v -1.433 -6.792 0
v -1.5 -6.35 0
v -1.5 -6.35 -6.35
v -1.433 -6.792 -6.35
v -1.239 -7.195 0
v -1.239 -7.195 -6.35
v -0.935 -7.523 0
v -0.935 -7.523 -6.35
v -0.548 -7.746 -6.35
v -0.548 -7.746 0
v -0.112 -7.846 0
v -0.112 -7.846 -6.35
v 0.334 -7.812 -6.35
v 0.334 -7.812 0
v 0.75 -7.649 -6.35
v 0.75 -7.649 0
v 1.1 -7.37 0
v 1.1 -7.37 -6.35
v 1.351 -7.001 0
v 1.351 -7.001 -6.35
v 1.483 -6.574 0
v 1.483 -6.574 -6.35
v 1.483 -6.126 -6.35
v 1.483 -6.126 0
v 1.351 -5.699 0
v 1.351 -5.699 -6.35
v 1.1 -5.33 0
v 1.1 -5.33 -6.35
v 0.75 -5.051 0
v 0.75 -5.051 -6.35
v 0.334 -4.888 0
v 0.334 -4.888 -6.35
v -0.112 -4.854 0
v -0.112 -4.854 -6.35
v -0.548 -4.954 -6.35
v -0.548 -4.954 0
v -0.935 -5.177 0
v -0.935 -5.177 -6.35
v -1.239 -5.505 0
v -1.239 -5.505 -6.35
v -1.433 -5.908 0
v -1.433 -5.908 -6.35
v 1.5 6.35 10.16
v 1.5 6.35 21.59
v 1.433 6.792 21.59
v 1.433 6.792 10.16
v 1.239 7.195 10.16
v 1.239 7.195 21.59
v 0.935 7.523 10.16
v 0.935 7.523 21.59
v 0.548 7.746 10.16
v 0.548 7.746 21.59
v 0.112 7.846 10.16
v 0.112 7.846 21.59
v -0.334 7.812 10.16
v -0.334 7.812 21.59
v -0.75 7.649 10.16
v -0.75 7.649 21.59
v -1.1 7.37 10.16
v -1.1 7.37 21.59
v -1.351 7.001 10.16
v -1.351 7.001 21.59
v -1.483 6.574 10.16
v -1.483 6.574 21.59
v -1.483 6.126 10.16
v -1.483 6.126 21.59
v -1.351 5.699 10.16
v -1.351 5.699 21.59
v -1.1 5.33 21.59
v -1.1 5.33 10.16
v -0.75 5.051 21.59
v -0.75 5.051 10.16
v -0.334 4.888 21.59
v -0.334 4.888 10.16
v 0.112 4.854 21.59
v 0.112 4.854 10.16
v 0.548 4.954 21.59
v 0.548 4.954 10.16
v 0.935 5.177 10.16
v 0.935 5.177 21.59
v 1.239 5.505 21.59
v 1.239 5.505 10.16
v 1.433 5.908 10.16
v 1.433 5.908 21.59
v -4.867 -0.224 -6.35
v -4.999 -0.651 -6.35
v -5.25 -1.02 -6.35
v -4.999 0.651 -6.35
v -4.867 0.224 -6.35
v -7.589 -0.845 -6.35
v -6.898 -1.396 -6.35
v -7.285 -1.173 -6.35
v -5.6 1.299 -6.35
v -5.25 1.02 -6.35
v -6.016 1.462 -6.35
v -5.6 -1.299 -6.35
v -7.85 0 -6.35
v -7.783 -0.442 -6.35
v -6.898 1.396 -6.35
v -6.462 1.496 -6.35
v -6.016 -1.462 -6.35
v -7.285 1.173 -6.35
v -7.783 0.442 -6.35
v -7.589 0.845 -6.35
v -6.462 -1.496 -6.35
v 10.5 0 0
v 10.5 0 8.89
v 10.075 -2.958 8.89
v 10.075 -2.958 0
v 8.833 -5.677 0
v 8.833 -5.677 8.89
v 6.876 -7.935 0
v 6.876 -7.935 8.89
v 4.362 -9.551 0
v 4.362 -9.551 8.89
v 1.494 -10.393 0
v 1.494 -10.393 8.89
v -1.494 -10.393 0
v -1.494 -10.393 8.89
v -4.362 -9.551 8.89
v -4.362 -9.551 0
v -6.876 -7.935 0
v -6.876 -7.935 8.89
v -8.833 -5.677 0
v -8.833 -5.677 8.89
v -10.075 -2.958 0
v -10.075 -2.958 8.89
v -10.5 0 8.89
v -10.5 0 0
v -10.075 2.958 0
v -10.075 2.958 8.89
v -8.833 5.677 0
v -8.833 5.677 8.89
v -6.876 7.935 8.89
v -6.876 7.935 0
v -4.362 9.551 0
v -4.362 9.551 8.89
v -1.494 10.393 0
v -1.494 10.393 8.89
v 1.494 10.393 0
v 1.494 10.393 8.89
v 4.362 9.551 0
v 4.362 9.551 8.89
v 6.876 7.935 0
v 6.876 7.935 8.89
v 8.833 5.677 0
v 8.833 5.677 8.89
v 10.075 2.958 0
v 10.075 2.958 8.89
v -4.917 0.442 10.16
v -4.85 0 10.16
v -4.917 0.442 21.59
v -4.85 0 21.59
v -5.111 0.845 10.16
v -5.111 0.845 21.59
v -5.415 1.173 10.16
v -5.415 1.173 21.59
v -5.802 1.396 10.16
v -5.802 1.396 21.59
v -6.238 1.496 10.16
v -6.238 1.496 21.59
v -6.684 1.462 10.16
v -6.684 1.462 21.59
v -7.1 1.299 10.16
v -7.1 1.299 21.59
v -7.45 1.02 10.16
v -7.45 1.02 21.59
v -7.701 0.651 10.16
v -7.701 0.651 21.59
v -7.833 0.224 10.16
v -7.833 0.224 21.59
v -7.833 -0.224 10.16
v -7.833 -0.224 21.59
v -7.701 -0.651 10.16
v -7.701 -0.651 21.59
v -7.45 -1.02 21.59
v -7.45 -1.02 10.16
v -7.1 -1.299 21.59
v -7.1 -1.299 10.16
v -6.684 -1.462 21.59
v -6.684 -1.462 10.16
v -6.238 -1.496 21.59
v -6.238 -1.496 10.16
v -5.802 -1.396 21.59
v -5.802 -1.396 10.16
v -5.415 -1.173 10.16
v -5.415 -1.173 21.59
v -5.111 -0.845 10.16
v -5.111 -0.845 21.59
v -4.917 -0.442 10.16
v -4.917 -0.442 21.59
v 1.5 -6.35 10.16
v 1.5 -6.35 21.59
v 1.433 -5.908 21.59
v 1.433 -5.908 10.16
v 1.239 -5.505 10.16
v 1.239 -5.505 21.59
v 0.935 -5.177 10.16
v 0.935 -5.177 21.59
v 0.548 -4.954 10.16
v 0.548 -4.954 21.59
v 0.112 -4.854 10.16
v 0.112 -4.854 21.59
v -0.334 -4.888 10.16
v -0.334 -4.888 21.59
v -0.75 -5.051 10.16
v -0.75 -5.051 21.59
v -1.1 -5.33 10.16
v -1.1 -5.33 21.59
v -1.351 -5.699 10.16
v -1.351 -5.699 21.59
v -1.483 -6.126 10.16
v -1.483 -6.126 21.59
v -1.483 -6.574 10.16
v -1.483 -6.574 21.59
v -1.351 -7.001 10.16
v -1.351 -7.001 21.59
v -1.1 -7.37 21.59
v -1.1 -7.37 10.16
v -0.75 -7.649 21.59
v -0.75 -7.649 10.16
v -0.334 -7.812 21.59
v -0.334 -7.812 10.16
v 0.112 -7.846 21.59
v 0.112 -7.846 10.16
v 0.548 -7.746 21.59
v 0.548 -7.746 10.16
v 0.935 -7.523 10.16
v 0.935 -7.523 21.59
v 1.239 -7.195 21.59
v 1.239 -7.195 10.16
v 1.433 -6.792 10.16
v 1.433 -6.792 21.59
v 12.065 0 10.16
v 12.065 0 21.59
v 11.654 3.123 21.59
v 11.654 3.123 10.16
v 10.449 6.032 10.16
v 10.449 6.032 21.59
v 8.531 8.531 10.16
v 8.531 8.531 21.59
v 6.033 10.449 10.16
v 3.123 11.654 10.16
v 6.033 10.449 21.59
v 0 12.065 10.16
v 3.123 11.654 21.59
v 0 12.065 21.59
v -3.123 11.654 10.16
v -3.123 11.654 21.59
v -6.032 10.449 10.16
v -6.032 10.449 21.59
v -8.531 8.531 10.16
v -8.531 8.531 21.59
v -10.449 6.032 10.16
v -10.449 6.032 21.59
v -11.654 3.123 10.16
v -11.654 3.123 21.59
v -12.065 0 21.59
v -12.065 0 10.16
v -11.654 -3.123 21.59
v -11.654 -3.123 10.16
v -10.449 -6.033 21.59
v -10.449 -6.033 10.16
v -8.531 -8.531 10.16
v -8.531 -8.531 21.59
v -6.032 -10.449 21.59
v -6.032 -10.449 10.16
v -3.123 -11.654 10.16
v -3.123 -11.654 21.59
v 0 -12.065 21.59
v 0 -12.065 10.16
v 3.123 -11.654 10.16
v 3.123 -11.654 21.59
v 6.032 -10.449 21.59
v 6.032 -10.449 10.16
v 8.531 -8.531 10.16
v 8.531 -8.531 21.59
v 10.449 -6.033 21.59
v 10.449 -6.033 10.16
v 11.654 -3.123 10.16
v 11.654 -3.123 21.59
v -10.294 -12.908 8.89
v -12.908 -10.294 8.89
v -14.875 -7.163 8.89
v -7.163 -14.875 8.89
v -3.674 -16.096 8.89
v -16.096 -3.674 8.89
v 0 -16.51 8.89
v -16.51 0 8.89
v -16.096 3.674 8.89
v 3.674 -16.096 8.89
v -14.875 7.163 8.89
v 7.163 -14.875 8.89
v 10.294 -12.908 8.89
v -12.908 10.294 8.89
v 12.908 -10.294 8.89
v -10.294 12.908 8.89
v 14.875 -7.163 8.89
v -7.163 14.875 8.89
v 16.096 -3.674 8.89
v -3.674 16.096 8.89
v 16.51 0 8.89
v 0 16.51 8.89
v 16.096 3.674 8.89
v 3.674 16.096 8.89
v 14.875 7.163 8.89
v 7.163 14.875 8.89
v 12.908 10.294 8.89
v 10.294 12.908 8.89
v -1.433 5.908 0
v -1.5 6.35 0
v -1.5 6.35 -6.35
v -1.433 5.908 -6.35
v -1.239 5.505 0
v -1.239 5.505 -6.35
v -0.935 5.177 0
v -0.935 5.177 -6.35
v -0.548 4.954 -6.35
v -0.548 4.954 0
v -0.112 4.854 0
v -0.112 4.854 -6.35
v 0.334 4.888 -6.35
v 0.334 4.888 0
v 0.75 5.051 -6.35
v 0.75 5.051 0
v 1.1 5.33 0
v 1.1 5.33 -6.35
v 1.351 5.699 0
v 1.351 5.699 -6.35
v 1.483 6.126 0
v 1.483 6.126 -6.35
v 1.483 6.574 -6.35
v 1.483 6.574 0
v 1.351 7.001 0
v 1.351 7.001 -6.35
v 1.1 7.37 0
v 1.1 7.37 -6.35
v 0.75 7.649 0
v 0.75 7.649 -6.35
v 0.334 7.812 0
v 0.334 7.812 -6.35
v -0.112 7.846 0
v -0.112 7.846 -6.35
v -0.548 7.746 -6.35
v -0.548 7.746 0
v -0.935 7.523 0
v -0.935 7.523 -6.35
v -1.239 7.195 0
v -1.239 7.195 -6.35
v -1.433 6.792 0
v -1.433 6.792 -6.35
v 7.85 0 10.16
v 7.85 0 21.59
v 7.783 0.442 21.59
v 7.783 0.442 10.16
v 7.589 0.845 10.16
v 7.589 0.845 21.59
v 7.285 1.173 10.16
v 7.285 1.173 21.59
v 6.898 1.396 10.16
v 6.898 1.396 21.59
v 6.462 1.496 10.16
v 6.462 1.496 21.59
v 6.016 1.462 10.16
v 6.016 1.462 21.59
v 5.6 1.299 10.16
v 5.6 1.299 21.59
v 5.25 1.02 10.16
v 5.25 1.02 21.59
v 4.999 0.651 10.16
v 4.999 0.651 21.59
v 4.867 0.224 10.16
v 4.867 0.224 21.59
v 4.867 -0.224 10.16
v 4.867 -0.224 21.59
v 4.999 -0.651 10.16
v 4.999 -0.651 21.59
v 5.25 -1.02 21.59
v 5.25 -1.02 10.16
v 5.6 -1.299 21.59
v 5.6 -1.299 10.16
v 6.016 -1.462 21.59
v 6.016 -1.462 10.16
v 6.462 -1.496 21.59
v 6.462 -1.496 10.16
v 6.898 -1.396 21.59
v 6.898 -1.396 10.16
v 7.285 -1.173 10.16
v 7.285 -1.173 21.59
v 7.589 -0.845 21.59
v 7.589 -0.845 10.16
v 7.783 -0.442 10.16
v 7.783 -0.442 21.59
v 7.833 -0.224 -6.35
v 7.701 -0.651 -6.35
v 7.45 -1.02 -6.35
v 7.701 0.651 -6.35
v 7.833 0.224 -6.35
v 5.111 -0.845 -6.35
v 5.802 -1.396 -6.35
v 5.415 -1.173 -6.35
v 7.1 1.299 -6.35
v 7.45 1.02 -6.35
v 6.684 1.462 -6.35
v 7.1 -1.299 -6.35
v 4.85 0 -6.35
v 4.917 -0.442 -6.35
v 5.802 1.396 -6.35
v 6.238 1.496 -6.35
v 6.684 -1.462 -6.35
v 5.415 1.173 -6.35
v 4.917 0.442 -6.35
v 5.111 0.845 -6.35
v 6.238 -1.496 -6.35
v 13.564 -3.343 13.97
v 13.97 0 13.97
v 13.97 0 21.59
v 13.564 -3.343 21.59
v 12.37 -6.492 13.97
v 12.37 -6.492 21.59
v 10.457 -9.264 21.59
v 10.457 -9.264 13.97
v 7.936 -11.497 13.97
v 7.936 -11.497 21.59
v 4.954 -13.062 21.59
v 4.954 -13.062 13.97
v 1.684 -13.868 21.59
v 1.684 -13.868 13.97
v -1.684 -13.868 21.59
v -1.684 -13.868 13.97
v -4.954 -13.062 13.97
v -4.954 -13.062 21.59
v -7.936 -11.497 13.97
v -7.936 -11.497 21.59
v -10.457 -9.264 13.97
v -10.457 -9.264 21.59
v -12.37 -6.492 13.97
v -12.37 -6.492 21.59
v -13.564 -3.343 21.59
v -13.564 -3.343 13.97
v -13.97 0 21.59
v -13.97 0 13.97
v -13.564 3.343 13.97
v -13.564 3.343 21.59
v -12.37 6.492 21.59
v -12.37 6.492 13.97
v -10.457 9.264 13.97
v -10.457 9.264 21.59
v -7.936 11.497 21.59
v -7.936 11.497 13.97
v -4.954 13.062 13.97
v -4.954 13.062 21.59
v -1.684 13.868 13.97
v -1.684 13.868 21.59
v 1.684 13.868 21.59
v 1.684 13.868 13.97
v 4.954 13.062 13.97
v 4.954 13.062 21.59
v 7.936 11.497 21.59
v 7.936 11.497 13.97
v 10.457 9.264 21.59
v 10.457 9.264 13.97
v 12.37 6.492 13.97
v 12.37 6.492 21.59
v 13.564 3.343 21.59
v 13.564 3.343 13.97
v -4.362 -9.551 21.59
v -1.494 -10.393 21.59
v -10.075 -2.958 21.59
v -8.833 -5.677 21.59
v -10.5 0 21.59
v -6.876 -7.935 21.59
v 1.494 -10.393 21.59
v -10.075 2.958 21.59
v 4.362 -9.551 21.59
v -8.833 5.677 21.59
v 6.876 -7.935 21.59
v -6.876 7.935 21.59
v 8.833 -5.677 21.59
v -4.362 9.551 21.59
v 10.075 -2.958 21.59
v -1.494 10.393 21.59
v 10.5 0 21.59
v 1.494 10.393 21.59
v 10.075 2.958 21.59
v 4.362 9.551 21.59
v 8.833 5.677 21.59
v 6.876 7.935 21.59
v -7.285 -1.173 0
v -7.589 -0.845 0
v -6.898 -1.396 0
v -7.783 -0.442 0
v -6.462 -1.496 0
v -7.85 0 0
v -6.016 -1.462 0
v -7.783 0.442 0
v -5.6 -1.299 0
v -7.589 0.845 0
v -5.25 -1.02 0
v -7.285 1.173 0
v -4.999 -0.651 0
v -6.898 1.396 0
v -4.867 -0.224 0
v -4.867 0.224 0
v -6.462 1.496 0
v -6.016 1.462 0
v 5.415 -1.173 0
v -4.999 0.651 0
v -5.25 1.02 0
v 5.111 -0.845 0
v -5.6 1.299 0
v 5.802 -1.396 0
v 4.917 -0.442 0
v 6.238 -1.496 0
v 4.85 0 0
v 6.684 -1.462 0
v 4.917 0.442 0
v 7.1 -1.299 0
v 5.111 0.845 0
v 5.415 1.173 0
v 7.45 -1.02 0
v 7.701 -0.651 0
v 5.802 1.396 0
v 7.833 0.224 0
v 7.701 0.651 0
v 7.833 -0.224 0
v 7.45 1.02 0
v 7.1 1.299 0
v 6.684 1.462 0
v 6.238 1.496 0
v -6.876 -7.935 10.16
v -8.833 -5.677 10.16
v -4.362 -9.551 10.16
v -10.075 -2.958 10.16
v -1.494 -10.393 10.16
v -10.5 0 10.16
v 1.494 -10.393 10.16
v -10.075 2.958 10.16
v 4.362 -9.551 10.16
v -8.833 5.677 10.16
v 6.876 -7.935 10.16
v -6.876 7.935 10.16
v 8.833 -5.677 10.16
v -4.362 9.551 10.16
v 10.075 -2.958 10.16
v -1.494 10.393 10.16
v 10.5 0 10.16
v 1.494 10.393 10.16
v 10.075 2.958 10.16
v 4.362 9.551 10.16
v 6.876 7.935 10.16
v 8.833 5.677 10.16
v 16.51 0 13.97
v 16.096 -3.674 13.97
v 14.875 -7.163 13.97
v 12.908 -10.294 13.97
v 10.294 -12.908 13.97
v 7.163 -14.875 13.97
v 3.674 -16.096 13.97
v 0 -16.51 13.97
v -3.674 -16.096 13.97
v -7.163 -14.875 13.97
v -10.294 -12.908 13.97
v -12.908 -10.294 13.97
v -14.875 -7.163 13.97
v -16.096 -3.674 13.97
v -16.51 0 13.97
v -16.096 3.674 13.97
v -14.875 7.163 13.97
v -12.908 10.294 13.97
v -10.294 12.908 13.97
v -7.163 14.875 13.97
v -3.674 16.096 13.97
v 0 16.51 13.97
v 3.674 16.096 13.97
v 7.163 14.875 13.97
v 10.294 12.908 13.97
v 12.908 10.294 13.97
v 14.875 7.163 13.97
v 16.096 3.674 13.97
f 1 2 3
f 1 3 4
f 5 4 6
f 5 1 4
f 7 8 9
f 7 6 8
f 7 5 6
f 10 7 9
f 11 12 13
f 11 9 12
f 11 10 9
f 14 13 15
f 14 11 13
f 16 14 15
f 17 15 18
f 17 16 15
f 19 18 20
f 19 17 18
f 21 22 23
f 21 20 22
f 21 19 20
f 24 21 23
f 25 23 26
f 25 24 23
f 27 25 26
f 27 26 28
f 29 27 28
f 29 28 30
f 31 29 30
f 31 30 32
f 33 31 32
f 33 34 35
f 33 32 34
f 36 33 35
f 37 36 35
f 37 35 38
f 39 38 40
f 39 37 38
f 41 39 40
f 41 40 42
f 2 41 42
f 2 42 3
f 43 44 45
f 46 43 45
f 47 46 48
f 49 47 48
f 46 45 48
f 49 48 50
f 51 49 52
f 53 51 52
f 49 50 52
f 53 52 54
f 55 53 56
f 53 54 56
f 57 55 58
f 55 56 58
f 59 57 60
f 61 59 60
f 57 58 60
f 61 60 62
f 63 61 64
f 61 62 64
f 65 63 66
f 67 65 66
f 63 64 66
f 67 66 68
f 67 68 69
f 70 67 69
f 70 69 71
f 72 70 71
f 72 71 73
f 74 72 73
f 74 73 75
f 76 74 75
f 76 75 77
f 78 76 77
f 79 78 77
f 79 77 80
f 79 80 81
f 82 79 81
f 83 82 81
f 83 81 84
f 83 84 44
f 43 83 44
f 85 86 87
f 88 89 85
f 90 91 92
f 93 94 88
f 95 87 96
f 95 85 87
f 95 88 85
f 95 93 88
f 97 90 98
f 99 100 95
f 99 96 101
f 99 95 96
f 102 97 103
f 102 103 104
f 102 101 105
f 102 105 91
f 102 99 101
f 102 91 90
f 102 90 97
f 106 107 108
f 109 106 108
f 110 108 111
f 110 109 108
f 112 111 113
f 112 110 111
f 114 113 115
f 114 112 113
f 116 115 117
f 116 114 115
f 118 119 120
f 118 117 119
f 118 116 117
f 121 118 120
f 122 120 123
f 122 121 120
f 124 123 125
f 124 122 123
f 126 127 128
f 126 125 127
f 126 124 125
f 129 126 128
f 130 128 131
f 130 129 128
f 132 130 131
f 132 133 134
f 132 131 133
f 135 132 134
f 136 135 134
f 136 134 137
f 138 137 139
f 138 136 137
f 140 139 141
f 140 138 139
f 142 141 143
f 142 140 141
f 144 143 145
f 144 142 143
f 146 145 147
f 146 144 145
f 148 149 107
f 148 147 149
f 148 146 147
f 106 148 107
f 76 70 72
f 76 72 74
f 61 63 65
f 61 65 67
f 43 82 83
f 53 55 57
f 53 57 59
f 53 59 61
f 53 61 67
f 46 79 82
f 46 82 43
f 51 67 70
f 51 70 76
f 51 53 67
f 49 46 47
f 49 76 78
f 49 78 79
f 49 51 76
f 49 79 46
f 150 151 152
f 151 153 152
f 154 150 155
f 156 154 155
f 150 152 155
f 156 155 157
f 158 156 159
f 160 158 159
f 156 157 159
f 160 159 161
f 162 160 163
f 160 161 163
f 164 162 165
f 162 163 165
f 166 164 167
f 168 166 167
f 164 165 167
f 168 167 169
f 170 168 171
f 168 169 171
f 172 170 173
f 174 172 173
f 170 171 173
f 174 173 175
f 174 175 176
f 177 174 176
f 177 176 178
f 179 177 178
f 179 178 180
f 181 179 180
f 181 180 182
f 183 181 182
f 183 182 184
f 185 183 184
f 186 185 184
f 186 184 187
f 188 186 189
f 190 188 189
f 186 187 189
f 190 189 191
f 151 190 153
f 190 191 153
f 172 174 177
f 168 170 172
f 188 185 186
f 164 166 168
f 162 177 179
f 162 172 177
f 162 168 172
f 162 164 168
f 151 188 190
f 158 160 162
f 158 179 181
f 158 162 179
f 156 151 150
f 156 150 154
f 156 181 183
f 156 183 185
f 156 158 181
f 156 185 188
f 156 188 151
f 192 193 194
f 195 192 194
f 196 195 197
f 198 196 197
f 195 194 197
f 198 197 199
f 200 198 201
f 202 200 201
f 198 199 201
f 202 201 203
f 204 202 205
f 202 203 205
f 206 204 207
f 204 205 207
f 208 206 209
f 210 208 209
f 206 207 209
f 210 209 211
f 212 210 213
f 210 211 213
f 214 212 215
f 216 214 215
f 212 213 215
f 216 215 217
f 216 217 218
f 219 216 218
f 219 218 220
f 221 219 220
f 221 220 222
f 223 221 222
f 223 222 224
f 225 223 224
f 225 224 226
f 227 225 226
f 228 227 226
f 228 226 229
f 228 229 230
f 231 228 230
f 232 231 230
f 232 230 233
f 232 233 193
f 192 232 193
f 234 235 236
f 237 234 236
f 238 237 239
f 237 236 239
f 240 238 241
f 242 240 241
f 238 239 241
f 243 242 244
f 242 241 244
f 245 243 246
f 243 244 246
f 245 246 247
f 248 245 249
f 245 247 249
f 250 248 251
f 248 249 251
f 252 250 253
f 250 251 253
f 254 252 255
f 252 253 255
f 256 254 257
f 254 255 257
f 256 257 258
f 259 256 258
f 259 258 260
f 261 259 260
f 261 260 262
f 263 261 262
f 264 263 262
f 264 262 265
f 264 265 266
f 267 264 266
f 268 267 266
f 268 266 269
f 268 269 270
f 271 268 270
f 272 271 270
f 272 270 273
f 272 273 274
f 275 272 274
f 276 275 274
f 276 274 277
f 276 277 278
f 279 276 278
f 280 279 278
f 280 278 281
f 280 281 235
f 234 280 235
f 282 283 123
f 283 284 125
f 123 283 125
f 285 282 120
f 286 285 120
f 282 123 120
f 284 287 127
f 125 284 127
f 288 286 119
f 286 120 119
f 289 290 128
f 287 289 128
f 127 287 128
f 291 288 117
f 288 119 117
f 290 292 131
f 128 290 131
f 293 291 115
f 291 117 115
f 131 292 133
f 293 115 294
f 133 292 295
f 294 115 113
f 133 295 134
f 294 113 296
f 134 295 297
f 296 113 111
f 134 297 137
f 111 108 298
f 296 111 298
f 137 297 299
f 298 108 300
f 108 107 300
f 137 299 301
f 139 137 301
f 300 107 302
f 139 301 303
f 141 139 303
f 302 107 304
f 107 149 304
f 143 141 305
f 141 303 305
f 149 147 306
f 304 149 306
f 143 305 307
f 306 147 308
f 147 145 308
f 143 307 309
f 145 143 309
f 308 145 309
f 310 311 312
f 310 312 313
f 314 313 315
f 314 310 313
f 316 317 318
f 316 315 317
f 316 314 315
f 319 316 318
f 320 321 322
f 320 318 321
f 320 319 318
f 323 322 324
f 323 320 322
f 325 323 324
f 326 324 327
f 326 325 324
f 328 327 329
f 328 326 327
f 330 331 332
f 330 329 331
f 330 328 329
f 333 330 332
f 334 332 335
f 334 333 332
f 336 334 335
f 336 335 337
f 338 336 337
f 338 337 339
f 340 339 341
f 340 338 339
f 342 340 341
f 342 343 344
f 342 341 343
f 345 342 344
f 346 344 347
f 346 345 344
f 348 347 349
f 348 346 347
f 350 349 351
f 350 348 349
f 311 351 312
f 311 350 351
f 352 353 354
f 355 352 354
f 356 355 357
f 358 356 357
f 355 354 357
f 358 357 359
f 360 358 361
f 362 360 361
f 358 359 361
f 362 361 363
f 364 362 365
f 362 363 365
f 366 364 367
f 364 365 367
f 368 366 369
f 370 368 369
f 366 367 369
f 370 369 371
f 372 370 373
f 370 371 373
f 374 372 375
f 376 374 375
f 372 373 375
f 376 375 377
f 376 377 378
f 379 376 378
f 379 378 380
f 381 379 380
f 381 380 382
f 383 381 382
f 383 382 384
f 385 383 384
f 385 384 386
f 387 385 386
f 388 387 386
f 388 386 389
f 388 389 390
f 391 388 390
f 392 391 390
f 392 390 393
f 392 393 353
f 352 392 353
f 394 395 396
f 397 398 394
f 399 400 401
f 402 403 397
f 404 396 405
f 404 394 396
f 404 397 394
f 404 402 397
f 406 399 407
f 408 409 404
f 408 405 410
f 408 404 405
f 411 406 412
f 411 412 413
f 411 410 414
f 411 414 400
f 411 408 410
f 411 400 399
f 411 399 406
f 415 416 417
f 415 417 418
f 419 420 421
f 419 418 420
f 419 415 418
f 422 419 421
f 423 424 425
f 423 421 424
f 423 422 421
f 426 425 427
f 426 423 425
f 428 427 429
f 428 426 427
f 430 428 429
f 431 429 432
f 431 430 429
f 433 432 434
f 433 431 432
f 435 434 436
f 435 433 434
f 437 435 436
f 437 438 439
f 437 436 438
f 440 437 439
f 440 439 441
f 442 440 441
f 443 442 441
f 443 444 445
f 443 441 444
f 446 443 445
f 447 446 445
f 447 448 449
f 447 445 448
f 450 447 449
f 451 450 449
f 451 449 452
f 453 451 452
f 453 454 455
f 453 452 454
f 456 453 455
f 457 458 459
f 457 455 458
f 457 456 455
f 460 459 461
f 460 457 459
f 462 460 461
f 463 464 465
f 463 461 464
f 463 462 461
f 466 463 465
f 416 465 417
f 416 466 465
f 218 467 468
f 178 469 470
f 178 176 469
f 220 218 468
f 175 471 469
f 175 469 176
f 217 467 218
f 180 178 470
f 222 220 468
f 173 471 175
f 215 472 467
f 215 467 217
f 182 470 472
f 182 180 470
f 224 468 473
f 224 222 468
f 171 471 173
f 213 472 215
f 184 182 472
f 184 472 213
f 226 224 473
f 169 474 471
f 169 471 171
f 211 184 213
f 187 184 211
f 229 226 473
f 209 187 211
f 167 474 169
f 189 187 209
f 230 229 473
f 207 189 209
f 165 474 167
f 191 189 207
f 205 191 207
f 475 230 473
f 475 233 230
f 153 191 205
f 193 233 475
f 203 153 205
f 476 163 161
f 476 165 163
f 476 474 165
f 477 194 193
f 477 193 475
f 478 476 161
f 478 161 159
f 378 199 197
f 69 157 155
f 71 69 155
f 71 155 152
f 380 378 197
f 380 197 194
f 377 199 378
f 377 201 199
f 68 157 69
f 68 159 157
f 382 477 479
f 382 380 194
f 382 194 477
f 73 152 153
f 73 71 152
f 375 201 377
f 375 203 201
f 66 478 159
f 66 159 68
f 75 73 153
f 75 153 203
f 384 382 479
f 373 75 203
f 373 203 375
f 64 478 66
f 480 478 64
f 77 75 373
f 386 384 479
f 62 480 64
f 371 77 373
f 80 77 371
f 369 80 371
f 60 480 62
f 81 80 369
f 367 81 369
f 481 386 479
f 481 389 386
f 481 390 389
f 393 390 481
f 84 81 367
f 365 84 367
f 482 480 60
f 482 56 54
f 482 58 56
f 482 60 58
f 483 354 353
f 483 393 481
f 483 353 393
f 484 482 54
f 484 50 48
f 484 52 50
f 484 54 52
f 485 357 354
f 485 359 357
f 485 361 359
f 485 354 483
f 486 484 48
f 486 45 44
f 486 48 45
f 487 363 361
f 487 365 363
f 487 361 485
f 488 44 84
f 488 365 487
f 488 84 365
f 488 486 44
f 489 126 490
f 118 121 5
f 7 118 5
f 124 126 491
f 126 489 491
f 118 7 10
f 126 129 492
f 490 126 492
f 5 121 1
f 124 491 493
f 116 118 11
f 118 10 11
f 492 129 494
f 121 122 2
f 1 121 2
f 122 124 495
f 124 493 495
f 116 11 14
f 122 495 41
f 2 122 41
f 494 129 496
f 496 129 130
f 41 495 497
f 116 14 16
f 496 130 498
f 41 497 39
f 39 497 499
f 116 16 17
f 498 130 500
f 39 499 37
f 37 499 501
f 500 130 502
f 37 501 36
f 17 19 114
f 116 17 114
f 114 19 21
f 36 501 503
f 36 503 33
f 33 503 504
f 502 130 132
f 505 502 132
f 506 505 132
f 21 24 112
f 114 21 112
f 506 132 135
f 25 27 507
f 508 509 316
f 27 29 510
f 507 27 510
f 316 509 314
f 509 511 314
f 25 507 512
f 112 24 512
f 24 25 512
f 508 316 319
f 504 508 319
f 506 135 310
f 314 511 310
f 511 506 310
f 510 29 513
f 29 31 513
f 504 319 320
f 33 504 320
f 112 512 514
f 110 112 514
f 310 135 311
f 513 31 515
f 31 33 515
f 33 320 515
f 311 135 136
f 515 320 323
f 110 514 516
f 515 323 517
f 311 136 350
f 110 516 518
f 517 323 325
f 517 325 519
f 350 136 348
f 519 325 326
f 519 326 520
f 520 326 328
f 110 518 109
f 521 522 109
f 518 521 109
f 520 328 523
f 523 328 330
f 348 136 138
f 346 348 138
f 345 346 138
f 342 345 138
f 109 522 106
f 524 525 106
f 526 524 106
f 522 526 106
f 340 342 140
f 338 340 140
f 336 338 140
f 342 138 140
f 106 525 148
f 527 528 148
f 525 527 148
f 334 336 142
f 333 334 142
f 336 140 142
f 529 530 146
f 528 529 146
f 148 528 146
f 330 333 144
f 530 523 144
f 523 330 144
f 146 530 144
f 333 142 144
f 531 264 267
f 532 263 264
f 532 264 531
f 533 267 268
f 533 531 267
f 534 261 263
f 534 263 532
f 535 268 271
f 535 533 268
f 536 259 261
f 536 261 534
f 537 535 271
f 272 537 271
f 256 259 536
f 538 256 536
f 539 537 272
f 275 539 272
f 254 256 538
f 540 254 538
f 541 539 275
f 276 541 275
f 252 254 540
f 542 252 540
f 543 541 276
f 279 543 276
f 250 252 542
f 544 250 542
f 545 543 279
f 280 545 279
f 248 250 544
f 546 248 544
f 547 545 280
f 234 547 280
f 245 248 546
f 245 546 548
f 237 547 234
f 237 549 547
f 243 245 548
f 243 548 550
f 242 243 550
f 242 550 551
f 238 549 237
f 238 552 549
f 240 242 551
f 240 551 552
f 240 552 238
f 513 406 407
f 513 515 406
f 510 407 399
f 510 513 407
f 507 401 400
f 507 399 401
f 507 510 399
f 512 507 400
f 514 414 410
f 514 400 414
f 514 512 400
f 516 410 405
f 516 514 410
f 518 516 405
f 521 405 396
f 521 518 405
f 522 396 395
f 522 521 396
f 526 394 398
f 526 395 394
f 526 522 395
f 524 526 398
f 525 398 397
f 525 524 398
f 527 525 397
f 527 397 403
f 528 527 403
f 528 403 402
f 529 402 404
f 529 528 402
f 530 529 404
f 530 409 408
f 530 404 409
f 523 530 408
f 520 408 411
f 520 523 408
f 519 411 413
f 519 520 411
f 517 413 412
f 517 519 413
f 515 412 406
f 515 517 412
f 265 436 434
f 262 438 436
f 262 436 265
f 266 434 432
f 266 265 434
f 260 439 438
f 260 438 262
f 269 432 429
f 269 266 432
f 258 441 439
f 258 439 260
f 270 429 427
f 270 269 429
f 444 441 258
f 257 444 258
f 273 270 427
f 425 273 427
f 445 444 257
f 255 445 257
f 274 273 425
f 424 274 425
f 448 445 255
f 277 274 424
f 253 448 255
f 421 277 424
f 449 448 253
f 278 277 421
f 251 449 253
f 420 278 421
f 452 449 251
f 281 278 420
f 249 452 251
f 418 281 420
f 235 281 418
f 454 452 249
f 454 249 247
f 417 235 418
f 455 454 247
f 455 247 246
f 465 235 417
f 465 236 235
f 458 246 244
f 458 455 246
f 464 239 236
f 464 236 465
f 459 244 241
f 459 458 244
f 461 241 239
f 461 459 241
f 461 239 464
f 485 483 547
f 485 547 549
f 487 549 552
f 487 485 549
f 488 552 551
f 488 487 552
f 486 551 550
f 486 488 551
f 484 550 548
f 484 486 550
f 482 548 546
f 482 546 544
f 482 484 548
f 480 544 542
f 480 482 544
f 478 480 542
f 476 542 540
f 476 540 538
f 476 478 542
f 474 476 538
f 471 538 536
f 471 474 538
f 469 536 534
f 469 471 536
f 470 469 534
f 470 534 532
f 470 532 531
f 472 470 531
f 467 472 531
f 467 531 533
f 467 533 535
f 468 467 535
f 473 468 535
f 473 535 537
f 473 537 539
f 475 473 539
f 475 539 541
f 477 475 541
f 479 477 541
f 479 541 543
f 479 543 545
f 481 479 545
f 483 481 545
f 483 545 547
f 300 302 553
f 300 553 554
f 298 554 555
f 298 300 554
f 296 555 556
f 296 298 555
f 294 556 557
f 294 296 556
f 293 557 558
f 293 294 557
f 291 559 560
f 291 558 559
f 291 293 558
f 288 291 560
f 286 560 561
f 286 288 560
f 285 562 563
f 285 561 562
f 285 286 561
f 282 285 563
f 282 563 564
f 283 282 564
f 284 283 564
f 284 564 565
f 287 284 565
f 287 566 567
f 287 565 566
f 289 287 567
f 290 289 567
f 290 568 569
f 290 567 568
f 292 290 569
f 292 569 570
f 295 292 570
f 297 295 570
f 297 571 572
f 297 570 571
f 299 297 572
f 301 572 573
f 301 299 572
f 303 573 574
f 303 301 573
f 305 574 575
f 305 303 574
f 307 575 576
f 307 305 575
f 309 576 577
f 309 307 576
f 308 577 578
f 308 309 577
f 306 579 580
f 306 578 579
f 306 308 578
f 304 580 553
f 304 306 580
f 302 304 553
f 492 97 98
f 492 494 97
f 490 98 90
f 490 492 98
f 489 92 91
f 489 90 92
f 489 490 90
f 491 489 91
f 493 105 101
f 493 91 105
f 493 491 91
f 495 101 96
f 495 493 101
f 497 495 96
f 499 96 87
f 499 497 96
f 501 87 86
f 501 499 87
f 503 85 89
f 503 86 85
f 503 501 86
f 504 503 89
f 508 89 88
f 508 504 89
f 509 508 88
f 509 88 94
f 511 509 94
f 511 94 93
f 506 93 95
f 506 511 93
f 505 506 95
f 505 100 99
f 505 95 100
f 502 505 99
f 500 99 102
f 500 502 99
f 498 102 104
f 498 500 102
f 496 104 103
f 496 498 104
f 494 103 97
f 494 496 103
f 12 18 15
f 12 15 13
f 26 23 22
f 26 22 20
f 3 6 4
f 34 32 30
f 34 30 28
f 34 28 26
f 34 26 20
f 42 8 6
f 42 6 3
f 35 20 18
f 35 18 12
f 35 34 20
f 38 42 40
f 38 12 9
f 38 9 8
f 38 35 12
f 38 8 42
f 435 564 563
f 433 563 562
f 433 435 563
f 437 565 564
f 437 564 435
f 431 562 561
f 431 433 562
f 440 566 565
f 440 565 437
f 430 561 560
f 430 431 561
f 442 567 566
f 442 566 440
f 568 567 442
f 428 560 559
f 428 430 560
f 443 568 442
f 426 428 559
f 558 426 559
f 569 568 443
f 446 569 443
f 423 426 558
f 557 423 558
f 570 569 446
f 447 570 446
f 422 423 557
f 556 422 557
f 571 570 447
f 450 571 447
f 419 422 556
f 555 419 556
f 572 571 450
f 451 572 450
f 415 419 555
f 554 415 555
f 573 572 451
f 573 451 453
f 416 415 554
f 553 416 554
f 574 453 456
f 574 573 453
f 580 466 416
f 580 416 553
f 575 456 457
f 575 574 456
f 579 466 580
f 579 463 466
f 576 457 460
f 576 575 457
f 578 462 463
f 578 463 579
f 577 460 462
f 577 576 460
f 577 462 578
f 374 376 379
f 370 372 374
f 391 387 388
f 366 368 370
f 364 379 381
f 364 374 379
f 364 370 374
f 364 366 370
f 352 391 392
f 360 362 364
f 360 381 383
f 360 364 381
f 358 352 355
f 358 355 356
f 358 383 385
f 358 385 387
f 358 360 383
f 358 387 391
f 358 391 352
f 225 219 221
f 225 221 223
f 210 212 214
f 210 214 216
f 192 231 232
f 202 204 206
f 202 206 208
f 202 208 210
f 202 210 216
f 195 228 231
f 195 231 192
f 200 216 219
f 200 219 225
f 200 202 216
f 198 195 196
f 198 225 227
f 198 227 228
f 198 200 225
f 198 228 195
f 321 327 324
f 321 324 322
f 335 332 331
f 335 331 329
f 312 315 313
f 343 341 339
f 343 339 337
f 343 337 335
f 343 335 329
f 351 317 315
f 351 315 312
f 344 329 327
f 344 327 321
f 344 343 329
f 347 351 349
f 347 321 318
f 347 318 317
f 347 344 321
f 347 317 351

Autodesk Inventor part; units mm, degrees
ref_plane "YZ Plane" through (0, 0, 0) normal (1, 0, 0) x (0, 1, 0)
ref_plane "XZ Plane" through (0, 0, 0) normal (0, 1, 0) x (-1, 0, 0)
ref_plane "XY Plane" through (0, 0, 0) normal (0, 0, 1) x (1, 0, 0)
sketch "Sketch1" plane through (0, 0, 0) normal (0, 0, 1) x (1, 0, 0)
  circle A0 centre (0, 0) radius 10.5
  dimension "d0" = 21
extrude "Extrusion1" add sketch "Sketch1" along normal blind 8.89
sketch "Sketch2" plane through (0, 0, 8.89) normal (0, 0, 1) x (1, 0, 0)
  circle A0 centre (0, 0) radius 16.51
  dimension "d3" = 33.02
extrude "Extrusion2" add sketch "Sketch2" along normal blind 5.08
sketch "Sketch3" plane through (0, 0, 13.97) normal (0, 0, 1) x (1, 0, 0)
  circle A0 centre (0, 0) radius 13.97
  dimension "d6" = 27.94
extrude "Extrusion3" add sketch "Sketch3" along normal blind 7.62
sketch "Sketch4" plane through (0, 0, 21.59) normal (0, 0, 1) x (1, 0, 0)
  circle A0 centre (0, 0) radius 6.35 construction
  circle A1 centre (0, 6.35) radius 1.5
  circle A2 centre (-6.35, 0) radius 1.5
  circle A3 centre (0, -6.35) radius 1.5
  circle A4 centre (6.35, 0) radius 1.5
  dimension "d9" = 12.7
  dimension "d10" = 3
  dimension "d13" = 360
extrude "Extrusion4" cut sketch "Sketch4" against normal blind 11.43
sketch "Sketch5" plane through (0, 0, 21.59) normal (0, 0, 1) x (1, 0, 0)
  circle A0 centre (0, 0) radius 10.5
  circle A1 centre (0, 0) radius 10.5 projected
  circle A2 centre (0, 0) radius 12.065
  dimension "d17" = 24.13
extrude "Extrusion5" cut sketch "Sketch5" against normal blind 11.43
sketch "Sketch6" plane through (0, 0, 0) normal (0, 0, -1) x (-1, 0, 0)
  circle A0 centre (0, 6.35) radius 1.5 projected
  circle A1 centre (0, 0) radius 6.35 construction
  circle A2 centre (0, 6.35) radius 1.5
  circle A3 centre (0, 0) radius 6.35 construction
  circle A4 centre (-6.35, 0) radius 1.5
  circle A5 centre (0, 0) radius 6.35 construction
  circle A6 centre (0, -6.35) radius 1.5
  circle A7 centre (0, 0) radius 6.35 construction
  circle A8 centre (6.35, 0) radius 1.5
  dimension "d22" = 360
extrude "Extrusion6" add sketch "Sketch6" along normal blind 6.35
properties part number "connector" material "Rubber"
